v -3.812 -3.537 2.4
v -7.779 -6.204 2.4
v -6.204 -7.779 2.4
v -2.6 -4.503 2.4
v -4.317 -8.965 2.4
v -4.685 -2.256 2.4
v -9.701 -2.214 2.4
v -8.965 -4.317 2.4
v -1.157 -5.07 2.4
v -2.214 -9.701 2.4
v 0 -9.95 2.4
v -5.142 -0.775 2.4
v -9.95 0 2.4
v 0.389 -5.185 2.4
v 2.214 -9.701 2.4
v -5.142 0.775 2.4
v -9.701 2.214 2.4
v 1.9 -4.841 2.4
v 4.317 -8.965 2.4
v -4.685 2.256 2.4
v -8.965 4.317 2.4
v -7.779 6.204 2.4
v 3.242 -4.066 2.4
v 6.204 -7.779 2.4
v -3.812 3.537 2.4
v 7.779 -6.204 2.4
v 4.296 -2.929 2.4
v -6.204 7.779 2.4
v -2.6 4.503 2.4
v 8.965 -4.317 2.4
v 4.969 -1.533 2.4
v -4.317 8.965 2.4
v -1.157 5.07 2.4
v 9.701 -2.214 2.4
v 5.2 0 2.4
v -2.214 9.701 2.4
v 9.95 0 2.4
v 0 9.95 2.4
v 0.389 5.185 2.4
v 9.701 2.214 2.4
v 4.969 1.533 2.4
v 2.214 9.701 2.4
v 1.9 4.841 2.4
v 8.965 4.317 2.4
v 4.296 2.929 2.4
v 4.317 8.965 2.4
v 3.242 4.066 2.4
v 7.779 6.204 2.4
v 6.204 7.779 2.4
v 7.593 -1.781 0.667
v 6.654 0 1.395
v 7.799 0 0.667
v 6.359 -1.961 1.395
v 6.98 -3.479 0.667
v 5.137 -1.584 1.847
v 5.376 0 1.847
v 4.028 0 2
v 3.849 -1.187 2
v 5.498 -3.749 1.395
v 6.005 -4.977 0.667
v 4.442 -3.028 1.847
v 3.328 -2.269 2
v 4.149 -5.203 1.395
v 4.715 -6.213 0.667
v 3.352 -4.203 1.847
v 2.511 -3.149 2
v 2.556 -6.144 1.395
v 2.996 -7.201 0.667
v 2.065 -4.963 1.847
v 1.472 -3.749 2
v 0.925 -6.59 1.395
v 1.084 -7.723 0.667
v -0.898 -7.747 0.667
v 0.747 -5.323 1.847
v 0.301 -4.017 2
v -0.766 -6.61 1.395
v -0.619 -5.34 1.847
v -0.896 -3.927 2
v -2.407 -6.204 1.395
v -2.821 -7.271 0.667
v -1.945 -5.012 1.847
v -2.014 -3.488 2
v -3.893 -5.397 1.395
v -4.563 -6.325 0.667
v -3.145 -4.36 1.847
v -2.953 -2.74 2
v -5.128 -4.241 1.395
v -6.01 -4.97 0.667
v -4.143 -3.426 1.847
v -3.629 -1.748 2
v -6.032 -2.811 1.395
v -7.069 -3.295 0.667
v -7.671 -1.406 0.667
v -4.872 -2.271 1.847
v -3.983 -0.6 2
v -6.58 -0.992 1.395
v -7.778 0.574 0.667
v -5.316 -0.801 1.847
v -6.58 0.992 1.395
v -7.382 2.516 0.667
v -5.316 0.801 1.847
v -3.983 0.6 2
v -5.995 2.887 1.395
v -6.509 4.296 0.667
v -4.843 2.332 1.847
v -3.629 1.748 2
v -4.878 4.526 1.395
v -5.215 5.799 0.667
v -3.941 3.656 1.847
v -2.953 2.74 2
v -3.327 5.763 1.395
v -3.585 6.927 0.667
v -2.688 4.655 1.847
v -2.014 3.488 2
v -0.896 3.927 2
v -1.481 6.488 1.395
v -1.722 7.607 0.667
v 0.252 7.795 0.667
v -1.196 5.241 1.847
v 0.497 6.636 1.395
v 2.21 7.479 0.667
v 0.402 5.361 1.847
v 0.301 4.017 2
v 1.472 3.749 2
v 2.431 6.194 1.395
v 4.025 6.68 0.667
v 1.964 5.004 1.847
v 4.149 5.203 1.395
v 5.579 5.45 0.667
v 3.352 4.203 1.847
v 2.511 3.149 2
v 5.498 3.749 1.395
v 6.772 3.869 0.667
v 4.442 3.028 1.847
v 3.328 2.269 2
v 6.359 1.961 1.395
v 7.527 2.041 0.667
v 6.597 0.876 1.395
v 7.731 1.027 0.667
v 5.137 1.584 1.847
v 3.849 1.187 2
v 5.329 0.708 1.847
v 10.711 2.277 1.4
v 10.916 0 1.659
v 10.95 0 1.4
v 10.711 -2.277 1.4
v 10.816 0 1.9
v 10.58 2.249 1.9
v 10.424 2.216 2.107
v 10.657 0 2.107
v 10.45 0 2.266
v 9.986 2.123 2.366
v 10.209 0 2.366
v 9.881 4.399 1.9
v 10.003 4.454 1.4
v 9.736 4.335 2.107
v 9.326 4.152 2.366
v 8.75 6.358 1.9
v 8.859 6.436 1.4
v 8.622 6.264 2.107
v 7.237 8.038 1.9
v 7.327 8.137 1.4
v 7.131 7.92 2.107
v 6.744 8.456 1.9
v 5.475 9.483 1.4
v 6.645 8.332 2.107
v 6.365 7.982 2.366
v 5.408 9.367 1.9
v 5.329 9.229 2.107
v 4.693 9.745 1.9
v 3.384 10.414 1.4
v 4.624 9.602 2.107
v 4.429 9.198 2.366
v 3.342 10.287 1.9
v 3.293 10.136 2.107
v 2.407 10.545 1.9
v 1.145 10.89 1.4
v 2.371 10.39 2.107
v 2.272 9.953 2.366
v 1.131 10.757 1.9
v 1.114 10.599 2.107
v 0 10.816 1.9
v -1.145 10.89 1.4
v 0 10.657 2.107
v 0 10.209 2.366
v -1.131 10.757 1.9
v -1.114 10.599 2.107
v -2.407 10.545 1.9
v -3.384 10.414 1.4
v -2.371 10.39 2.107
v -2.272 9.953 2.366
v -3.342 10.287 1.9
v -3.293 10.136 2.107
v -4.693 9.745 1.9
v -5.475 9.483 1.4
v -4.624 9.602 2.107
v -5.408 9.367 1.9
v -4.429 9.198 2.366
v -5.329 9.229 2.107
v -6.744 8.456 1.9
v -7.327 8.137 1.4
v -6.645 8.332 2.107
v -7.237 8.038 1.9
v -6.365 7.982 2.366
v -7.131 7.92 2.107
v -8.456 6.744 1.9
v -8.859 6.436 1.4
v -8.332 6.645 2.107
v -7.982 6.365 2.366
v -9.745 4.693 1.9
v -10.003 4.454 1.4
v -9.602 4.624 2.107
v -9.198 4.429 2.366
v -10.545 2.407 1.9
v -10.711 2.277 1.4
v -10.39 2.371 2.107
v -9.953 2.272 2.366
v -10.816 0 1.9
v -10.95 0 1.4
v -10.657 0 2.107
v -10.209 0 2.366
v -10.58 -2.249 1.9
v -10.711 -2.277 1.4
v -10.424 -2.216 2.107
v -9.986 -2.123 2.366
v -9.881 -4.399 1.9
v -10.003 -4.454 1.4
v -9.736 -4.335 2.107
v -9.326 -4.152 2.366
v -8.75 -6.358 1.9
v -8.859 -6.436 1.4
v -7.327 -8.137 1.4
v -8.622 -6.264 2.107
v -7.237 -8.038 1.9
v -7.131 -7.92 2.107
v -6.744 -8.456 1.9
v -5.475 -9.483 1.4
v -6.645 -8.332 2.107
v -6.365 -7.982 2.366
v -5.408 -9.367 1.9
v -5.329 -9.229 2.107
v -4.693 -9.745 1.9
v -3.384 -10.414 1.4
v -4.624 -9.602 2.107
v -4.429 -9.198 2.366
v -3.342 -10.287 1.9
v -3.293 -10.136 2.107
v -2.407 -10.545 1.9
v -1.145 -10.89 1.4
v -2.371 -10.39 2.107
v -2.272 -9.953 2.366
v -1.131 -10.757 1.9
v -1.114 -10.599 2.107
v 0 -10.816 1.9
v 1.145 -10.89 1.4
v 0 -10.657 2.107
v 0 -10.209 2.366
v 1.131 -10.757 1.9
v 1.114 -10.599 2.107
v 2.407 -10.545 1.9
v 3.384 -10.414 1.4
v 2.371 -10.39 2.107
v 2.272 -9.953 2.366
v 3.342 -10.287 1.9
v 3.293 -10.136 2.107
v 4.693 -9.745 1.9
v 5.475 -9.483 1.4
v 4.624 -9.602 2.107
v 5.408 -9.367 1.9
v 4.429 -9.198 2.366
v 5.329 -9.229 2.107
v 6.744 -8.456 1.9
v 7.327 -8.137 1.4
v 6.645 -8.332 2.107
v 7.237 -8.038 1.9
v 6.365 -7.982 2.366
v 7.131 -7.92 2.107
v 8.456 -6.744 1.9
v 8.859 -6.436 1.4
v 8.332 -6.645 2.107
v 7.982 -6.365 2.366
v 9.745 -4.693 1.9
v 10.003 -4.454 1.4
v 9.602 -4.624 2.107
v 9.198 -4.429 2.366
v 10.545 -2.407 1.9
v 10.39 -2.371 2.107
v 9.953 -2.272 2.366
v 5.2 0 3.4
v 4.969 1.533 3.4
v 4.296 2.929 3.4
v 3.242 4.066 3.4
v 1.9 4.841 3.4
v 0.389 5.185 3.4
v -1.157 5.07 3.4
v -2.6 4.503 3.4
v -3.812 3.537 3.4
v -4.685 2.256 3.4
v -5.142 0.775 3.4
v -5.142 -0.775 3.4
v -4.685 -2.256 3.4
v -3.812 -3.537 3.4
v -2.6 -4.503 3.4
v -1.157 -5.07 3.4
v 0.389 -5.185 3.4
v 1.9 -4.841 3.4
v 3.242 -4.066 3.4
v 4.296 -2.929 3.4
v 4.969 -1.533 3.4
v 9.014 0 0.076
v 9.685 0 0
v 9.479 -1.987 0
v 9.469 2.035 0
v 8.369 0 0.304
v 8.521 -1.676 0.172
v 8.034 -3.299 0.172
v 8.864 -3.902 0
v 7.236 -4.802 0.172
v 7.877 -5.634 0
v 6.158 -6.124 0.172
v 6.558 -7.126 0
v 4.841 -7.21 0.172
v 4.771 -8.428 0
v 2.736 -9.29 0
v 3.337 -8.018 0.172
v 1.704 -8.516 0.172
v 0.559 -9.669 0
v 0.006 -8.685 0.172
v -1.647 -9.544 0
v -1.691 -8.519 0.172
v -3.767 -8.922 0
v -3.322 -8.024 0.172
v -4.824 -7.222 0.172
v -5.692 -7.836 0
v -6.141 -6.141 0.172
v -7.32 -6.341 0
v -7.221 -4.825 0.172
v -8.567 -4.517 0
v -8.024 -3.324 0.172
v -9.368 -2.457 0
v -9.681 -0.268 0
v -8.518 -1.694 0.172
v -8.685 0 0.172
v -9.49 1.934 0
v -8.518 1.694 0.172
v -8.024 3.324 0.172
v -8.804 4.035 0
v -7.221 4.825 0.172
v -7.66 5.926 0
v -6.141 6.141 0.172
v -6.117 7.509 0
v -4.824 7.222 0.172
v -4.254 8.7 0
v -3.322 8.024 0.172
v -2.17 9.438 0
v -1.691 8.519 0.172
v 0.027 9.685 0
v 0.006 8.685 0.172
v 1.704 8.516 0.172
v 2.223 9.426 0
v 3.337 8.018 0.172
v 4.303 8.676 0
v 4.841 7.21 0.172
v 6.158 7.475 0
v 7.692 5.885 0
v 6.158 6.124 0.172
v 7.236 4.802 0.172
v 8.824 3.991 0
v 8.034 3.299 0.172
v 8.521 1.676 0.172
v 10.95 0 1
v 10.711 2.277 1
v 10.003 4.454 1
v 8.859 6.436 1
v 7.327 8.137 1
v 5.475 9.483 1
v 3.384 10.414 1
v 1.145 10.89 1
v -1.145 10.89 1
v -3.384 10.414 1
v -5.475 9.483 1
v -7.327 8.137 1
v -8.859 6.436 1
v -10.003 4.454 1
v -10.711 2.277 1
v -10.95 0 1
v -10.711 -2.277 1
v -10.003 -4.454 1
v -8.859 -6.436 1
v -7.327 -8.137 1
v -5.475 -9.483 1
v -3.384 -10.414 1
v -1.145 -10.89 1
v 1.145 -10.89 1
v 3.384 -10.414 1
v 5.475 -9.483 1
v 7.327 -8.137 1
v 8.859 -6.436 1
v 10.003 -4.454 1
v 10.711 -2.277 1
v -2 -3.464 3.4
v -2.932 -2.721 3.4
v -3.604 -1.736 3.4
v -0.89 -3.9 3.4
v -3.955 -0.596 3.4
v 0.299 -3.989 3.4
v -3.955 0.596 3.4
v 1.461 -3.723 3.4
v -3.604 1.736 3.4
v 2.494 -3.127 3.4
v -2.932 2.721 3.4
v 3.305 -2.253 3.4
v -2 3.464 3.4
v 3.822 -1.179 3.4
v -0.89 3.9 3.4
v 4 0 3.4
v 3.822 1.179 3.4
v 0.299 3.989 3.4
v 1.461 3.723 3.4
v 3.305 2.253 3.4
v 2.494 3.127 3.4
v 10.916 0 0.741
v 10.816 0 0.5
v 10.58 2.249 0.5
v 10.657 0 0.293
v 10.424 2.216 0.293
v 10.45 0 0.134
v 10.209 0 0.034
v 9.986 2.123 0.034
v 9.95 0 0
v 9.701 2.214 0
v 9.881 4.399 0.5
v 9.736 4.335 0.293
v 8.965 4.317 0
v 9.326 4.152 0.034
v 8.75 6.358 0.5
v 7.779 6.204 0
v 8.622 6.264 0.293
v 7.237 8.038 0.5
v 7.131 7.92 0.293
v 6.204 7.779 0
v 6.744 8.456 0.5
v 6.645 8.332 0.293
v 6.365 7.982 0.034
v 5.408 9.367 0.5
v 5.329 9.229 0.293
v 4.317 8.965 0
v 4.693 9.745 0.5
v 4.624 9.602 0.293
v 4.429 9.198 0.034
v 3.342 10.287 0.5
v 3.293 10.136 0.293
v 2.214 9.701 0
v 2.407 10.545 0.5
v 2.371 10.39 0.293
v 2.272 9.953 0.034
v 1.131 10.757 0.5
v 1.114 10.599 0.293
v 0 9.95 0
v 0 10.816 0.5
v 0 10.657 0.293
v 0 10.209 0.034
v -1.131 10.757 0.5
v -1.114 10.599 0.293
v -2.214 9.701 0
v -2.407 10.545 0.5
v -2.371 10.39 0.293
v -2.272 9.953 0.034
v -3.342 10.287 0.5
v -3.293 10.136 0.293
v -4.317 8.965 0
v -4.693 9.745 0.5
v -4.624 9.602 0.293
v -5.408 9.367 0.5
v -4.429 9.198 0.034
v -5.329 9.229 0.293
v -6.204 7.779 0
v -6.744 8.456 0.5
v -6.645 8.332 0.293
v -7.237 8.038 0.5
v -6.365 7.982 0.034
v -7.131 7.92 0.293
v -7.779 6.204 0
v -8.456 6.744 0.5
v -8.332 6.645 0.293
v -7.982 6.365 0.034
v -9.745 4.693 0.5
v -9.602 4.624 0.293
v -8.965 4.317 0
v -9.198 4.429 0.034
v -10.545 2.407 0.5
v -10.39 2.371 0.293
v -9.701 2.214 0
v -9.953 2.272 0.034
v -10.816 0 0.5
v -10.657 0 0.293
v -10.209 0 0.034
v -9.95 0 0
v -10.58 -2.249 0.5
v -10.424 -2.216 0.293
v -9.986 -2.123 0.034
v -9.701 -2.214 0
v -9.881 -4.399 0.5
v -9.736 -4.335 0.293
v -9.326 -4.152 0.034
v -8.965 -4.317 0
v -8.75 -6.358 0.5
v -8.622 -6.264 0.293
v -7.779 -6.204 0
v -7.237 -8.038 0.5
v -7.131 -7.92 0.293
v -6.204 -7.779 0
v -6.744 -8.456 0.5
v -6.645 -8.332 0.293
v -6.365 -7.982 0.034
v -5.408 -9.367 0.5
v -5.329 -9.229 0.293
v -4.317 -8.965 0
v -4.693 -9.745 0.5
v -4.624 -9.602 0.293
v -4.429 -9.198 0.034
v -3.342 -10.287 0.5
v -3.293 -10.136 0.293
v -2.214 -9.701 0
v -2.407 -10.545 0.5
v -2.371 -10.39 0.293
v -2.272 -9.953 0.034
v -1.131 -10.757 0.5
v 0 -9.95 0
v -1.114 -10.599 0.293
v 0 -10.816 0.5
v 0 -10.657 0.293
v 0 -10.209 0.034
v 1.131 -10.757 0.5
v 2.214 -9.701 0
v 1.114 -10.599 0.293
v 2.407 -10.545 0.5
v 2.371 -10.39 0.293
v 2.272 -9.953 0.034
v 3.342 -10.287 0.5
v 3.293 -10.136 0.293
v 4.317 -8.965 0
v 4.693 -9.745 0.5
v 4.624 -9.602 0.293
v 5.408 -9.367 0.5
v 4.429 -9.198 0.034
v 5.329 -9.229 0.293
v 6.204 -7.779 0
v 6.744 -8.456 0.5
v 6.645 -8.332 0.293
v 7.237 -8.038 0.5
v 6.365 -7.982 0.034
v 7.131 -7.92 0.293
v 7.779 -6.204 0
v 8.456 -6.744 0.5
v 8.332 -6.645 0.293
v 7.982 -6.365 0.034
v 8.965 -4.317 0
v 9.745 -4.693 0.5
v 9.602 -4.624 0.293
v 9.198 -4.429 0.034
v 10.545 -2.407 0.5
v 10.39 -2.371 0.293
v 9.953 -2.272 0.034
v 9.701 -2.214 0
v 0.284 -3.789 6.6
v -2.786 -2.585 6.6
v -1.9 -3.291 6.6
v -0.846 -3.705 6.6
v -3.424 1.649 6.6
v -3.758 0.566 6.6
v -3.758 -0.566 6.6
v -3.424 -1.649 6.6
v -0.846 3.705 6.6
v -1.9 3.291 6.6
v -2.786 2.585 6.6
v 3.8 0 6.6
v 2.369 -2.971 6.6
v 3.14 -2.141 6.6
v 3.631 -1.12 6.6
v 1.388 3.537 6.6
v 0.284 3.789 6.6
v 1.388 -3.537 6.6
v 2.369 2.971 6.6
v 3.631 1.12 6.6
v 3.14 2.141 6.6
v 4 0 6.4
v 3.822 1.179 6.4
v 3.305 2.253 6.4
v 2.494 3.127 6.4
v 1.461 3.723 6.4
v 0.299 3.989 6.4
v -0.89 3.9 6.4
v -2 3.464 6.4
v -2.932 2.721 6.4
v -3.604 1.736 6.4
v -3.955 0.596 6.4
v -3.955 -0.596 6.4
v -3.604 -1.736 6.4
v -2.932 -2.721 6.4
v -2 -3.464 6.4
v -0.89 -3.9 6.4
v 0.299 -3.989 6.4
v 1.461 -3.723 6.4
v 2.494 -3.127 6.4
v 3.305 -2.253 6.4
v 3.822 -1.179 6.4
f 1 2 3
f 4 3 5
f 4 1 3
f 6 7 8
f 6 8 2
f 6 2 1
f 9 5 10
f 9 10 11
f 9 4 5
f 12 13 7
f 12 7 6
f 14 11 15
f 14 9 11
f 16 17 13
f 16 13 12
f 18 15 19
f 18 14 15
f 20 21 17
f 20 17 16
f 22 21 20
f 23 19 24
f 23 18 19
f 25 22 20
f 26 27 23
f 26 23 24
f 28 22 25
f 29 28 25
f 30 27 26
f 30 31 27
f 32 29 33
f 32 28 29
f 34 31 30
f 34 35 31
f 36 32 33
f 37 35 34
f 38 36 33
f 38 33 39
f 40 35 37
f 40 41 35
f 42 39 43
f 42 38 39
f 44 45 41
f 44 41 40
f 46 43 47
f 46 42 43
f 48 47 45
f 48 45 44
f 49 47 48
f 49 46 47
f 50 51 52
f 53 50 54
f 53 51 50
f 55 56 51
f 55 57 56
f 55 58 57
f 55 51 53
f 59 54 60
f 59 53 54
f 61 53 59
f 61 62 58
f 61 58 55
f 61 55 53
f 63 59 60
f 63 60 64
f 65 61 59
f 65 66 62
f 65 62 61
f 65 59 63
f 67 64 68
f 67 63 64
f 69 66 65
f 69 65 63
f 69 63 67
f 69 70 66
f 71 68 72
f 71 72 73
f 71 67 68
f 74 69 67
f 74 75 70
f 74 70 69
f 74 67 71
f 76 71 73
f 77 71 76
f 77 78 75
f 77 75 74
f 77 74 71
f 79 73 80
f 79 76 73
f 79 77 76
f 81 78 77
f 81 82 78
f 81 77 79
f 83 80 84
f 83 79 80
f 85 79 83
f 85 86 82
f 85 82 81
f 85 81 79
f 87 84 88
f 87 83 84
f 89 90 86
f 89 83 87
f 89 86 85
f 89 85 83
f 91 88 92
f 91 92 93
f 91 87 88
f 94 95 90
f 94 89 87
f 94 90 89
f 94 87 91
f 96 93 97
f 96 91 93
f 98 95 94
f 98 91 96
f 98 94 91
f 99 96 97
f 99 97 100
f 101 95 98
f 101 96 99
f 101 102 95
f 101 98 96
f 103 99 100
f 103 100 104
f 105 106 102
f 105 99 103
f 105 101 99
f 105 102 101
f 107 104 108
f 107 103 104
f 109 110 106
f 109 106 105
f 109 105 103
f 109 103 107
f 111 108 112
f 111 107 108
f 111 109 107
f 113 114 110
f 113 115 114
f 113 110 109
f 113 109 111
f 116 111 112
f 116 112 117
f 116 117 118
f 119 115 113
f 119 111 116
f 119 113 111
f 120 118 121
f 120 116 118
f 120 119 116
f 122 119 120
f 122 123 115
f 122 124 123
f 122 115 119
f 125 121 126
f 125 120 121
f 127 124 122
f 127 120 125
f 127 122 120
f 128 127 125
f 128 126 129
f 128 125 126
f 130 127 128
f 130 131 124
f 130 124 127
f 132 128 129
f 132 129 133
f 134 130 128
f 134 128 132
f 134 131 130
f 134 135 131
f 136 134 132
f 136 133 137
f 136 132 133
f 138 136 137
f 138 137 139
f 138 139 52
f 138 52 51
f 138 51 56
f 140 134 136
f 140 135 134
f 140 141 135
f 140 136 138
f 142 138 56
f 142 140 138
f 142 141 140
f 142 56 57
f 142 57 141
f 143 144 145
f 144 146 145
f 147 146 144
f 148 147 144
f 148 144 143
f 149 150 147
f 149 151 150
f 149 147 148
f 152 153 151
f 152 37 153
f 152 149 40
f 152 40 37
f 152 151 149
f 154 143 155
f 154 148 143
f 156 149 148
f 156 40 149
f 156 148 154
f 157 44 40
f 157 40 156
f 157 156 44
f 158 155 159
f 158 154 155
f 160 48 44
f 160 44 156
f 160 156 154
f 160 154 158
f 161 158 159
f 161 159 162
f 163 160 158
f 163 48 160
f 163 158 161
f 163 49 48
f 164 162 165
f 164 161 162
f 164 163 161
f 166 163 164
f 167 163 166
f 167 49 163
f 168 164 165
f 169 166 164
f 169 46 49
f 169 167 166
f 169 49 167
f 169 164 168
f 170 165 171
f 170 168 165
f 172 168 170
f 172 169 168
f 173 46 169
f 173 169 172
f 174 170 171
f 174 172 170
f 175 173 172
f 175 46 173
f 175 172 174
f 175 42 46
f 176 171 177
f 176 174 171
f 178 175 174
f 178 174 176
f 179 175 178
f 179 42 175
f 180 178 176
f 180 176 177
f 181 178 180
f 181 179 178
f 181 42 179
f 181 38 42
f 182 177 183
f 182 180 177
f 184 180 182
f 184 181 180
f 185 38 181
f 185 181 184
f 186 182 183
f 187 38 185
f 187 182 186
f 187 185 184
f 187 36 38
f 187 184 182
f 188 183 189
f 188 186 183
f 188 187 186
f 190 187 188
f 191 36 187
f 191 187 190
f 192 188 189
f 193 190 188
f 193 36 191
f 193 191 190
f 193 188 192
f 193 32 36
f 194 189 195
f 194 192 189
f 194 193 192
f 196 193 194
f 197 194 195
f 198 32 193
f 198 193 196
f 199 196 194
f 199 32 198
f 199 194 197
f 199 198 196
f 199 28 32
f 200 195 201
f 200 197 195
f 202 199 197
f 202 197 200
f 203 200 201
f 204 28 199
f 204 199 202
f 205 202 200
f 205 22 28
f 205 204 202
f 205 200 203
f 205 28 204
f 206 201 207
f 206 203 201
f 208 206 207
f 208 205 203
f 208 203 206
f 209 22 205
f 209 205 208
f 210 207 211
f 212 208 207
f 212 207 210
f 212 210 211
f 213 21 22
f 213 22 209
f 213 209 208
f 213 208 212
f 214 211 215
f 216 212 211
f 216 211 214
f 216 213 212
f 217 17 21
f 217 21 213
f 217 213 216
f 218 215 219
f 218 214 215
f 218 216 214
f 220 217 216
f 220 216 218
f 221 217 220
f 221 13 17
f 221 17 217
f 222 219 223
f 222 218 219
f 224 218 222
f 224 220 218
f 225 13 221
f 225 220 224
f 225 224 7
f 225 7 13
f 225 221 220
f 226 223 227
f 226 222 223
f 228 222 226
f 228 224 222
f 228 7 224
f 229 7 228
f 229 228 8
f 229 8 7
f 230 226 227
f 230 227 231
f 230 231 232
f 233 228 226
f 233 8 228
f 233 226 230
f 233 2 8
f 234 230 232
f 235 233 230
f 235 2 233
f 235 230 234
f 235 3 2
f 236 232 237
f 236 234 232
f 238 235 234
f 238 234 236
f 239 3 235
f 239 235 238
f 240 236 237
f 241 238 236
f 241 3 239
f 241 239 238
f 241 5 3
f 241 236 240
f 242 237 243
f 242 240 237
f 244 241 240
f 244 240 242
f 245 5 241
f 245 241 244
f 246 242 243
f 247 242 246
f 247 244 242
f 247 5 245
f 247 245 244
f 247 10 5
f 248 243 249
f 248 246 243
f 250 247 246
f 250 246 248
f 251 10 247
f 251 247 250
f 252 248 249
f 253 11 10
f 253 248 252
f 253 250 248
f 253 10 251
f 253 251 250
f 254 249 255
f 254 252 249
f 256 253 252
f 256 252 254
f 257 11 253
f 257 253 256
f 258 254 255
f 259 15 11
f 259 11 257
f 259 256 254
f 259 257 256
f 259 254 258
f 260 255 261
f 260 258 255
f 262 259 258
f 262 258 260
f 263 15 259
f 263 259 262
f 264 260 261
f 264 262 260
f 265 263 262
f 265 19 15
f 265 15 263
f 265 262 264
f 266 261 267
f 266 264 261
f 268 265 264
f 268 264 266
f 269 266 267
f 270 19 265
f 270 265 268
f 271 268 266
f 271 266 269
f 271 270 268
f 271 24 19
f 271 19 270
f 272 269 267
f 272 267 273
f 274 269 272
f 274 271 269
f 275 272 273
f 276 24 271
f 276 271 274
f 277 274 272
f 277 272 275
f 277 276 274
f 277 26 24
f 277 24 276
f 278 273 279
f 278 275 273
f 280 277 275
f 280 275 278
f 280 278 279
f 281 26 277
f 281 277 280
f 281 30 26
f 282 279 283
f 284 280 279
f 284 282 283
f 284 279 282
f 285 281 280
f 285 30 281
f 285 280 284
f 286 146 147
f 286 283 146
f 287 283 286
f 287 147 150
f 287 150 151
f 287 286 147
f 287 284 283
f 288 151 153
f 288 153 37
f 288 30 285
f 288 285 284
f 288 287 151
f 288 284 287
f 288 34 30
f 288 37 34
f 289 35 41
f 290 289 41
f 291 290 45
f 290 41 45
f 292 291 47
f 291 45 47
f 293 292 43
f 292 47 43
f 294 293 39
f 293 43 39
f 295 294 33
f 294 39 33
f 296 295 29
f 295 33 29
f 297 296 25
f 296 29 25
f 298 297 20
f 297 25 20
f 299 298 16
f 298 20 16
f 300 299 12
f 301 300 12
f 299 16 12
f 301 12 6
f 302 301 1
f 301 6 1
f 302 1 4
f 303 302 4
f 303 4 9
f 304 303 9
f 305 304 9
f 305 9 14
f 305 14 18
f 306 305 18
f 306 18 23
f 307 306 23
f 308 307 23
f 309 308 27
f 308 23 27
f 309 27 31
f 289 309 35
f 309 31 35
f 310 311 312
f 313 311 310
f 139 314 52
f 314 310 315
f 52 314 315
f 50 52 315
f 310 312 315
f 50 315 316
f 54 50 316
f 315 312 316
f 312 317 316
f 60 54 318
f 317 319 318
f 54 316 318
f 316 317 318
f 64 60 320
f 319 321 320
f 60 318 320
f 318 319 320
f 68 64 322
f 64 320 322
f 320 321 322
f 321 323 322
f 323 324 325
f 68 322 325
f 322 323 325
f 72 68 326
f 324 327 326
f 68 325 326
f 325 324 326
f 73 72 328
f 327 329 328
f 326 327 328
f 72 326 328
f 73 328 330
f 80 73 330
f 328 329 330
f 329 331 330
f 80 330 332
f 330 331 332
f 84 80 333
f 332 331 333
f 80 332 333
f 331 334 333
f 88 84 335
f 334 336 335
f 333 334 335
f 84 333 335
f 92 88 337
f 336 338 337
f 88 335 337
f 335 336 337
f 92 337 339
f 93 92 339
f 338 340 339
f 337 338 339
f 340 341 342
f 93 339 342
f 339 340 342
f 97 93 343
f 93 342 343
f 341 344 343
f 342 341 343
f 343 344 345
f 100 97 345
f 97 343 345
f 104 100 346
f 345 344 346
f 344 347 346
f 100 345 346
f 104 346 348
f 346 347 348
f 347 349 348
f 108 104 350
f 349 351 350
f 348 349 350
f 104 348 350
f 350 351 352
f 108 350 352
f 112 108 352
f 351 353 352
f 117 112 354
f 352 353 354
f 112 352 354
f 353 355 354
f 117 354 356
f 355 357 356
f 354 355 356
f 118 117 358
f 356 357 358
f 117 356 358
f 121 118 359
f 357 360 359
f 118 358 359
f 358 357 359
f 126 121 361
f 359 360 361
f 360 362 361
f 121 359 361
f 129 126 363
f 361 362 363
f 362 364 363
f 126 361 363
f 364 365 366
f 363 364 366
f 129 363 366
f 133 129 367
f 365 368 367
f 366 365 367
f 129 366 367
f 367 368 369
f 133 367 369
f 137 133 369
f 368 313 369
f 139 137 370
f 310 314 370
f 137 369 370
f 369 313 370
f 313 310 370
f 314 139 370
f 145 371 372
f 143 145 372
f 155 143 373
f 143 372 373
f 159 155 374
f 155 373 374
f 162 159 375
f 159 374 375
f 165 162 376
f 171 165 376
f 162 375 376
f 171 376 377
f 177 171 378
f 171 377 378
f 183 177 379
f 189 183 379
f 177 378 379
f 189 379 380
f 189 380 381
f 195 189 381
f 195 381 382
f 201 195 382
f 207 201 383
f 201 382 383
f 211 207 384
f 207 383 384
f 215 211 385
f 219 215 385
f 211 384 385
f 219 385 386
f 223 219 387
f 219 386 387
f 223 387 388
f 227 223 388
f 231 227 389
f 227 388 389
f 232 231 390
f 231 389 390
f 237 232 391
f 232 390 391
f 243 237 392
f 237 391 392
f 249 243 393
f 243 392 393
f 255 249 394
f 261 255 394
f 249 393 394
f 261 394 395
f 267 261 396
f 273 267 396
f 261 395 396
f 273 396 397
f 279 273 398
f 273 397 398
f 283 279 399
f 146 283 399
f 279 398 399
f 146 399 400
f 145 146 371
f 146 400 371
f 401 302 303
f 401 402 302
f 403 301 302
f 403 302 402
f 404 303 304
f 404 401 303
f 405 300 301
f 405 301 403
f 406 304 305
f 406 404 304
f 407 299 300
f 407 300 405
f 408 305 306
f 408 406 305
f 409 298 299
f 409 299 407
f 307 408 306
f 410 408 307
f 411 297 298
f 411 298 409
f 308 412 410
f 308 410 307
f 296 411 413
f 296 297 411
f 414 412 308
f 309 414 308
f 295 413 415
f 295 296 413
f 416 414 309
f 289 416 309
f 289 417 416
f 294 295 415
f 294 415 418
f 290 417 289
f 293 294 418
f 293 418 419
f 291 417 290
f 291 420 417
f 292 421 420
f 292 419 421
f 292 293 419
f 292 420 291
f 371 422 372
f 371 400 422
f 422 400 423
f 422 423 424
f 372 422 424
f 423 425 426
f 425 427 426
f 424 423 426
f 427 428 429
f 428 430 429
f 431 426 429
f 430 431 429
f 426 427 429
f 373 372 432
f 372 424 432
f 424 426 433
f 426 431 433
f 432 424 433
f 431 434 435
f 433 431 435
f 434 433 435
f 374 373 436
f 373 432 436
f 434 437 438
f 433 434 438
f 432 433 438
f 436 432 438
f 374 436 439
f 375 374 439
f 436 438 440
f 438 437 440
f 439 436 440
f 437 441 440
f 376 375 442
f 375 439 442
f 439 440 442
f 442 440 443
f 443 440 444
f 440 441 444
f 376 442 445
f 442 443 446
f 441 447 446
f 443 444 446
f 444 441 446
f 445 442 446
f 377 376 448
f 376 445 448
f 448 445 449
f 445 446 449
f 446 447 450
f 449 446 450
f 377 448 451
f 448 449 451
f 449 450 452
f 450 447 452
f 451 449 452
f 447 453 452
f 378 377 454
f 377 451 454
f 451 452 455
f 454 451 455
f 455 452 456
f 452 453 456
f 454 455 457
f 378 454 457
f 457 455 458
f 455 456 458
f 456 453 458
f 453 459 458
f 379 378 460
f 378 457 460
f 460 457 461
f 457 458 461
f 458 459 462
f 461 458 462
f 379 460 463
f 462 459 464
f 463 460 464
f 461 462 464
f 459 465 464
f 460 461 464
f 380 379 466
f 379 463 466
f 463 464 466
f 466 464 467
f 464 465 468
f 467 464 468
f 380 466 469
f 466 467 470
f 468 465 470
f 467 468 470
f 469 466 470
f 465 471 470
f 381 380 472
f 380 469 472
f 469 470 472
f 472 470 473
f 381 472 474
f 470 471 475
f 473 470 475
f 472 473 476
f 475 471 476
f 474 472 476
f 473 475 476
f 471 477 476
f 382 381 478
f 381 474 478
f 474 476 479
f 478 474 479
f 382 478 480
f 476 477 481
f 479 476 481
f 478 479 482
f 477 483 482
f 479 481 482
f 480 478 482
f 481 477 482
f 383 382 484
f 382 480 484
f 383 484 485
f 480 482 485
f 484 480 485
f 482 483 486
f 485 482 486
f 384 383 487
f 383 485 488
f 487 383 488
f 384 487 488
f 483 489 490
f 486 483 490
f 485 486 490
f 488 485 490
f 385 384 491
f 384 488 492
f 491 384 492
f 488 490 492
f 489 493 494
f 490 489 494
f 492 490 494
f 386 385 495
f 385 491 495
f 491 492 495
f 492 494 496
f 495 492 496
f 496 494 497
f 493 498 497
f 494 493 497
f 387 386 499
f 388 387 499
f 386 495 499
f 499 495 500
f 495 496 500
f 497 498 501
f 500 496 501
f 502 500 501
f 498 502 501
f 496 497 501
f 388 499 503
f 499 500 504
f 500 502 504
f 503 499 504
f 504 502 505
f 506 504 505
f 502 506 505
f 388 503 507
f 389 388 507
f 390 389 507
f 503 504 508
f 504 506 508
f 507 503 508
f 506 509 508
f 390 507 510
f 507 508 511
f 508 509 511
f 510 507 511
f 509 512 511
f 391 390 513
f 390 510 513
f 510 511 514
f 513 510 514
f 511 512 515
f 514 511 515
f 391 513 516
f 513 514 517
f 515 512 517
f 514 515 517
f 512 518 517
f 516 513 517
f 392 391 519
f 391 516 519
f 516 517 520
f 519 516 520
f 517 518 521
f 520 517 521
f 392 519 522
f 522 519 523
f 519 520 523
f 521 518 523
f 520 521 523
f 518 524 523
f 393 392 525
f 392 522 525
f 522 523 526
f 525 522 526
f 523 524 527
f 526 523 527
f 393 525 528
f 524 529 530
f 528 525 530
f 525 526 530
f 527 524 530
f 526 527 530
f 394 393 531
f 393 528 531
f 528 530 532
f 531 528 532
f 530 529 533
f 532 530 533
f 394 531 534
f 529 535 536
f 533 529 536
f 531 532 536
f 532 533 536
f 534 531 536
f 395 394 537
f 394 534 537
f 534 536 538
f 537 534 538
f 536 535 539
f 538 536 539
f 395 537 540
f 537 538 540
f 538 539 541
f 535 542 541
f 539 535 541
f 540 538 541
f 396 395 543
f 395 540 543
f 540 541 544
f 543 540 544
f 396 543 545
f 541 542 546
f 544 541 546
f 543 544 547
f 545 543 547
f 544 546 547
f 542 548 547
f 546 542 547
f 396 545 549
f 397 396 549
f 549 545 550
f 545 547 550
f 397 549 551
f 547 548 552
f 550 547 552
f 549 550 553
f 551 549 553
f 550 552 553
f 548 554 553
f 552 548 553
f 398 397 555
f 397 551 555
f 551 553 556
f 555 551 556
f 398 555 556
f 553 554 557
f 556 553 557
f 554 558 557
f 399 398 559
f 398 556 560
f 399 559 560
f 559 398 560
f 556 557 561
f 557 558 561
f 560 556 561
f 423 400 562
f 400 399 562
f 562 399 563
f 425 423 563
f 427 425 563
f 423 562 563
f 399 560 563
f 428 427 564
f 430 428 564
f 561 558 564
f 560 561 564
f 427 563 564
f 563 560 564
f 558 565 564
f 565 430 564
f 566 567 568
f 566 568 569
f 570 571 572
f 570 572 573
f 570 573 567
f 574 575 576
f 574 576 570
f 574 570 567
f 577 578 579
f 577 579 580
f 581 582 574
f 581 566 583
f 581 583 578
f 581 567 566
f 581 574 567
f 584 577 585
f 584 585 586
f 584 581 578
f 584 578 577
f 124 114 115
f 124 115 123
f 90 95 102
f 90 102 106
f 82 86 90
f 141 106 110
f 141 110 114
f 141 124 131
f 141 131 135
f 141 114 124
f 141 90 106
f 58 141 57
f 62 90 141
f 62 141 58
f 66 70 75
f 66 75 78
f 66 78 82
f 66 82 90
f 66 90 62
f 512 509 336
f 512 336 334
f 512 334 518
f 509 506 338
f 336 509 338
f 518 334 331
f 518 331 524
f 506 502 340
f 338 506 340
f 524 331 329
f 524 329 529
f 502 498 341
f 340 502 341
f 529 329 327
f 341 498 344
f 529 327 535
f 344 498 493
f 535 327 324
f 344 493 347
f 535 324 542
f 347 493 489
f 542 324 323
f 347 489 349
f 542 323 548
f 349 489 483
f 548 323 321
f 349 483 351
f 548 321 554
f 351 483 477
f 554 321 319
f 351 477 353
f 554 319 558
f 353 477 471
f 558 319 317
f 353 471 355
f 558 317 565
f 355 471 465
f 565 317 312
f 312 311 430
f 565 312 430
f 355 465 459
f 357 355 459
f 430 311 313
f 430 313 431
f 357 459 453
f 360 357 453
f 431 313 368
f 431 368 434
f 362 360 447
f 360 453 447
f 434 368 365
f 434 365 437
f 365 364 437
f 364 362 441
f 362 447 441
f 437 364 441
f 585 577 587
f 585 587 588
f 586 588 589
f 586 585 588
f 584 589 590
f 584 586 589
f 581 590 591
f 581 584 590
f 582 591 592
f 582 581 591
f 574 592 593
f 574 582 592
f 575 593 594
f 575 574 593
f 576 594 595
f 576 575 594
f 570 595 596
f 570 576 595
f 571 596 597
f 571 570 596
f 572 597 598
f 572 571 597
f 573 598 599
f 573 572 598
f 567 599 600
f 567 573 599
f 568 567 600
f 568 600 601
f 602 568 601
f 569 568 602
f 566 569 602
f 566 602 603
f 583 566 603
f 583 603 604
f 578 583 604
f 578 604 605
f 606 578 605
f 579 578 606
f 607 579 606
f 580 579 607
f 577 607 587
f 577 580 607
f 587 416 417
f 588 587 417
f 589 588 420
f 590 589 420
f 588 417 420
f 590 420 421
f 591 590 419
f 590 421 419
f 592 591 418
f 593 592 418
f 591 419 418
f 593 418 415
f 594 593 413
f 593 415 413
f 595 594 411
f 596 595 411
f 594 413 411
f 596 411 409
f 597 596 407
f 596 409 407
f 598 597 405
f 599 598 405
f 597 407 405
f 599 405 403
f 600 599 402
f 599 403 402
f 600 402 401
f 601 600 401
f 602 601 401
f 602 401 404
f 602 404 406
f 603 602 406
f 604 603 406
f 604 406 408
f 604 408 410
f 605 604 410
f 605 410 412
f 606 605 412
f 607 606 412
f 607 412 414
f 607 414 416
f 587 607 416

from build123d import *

# Parameters (mm, degrees)
F0_R     = 10.95
F1_DEPTH = 2.4
F2_R     = 4
F3_DEPTH = 4.2
F4_R     = 1
F5_R     = 5.2
F5_R_2   = 4
F6_DEPTH = 1
F7_R     = 1
F8_R     = 8.5
F9_DEPTH = 2
F11_SIZE = 0.2
F12_R    = 3


# Not quite as in the source:
# - a fillet or chamfer that OpenCascade refuses, or shapes differently, is made with other operations: its cross-section is extruded or revolved along the edge and cut away or added


with BuildPart() as f1:
    # F0 (on Top) → F1 (new body)
    with BuildSketch(Plane.XY):
        Circle(F0_R)
    extrude(amount=F1_DEPTH)

    # F2 (on face) → F3 (join)
    with BuildSketch(Plane.XY.offset(2.4)):
        Circle(F2_R)
    extrude(amount=F3_DEPTH)

    # F4
    f4_edges = [f1.edges().sort_by_distance(p)[0] for p in [
        (-10.95, 0, 2.4),
    ]]
    fillet(f4_edges, radius=F4_R)

    # F5 (on face) → F6 (join)
    with BuildSketch(Plane.XY.offset(2.4)):
        Circle(F5_R)
        Circle(F5_R_2, mode=Mode.SUBTRACT)
    extrude(amount=F6_DEPTH)

    # F7
    f7_edges = [f1.edges().sort_by_distance(p)[0] for p in [
        (-10.95, 0, 0),
    ]]
    fillet(f7_edges, radius=F7_R)

    # F8 (on face) → F9 (cut)
    with BuildSketch(Plane(origin=(0, 0, 0), x_dir=(1, 0, 0), z_dir=(0, 0, -1))):
        Circle(F8_R)
    extrude(amount=-F9_DEPTH, mode=Mode.SUBTRACT)

    # F10: fillet of radius 6 on 1 edges, made by hand

    # F10_s1 → F10_t2 (revolve)
    with BuildSketch(Plane.XZ):
        with BuildLine():
            ThreePointArc((8.5, 0), (6.4773537878, 1.4772255751), (4.027864045, 2))
            Line((4.027864045, 2), (8.5, 2))
            Line((8.5, 2), (8.5, 0))
        make_face()
    revolve(axis=Axis((0, 0, 2), (0, 0, -1)))

    # F11
    f11_edges = [f1.edges().sort_by_distance(p)[0] for p in [
        (-4, 0, 6.6),
    ]]
    chamfer(f11_edges, length=F11_SIZE)

    # F12
    f12_edges = [f1.edges().sort_by_distance(p)[0] for p in [
        (-8.5, 0, 0),
    ]]
    fillet(f12_edges, radius=F12_R)


solid = f1.part
